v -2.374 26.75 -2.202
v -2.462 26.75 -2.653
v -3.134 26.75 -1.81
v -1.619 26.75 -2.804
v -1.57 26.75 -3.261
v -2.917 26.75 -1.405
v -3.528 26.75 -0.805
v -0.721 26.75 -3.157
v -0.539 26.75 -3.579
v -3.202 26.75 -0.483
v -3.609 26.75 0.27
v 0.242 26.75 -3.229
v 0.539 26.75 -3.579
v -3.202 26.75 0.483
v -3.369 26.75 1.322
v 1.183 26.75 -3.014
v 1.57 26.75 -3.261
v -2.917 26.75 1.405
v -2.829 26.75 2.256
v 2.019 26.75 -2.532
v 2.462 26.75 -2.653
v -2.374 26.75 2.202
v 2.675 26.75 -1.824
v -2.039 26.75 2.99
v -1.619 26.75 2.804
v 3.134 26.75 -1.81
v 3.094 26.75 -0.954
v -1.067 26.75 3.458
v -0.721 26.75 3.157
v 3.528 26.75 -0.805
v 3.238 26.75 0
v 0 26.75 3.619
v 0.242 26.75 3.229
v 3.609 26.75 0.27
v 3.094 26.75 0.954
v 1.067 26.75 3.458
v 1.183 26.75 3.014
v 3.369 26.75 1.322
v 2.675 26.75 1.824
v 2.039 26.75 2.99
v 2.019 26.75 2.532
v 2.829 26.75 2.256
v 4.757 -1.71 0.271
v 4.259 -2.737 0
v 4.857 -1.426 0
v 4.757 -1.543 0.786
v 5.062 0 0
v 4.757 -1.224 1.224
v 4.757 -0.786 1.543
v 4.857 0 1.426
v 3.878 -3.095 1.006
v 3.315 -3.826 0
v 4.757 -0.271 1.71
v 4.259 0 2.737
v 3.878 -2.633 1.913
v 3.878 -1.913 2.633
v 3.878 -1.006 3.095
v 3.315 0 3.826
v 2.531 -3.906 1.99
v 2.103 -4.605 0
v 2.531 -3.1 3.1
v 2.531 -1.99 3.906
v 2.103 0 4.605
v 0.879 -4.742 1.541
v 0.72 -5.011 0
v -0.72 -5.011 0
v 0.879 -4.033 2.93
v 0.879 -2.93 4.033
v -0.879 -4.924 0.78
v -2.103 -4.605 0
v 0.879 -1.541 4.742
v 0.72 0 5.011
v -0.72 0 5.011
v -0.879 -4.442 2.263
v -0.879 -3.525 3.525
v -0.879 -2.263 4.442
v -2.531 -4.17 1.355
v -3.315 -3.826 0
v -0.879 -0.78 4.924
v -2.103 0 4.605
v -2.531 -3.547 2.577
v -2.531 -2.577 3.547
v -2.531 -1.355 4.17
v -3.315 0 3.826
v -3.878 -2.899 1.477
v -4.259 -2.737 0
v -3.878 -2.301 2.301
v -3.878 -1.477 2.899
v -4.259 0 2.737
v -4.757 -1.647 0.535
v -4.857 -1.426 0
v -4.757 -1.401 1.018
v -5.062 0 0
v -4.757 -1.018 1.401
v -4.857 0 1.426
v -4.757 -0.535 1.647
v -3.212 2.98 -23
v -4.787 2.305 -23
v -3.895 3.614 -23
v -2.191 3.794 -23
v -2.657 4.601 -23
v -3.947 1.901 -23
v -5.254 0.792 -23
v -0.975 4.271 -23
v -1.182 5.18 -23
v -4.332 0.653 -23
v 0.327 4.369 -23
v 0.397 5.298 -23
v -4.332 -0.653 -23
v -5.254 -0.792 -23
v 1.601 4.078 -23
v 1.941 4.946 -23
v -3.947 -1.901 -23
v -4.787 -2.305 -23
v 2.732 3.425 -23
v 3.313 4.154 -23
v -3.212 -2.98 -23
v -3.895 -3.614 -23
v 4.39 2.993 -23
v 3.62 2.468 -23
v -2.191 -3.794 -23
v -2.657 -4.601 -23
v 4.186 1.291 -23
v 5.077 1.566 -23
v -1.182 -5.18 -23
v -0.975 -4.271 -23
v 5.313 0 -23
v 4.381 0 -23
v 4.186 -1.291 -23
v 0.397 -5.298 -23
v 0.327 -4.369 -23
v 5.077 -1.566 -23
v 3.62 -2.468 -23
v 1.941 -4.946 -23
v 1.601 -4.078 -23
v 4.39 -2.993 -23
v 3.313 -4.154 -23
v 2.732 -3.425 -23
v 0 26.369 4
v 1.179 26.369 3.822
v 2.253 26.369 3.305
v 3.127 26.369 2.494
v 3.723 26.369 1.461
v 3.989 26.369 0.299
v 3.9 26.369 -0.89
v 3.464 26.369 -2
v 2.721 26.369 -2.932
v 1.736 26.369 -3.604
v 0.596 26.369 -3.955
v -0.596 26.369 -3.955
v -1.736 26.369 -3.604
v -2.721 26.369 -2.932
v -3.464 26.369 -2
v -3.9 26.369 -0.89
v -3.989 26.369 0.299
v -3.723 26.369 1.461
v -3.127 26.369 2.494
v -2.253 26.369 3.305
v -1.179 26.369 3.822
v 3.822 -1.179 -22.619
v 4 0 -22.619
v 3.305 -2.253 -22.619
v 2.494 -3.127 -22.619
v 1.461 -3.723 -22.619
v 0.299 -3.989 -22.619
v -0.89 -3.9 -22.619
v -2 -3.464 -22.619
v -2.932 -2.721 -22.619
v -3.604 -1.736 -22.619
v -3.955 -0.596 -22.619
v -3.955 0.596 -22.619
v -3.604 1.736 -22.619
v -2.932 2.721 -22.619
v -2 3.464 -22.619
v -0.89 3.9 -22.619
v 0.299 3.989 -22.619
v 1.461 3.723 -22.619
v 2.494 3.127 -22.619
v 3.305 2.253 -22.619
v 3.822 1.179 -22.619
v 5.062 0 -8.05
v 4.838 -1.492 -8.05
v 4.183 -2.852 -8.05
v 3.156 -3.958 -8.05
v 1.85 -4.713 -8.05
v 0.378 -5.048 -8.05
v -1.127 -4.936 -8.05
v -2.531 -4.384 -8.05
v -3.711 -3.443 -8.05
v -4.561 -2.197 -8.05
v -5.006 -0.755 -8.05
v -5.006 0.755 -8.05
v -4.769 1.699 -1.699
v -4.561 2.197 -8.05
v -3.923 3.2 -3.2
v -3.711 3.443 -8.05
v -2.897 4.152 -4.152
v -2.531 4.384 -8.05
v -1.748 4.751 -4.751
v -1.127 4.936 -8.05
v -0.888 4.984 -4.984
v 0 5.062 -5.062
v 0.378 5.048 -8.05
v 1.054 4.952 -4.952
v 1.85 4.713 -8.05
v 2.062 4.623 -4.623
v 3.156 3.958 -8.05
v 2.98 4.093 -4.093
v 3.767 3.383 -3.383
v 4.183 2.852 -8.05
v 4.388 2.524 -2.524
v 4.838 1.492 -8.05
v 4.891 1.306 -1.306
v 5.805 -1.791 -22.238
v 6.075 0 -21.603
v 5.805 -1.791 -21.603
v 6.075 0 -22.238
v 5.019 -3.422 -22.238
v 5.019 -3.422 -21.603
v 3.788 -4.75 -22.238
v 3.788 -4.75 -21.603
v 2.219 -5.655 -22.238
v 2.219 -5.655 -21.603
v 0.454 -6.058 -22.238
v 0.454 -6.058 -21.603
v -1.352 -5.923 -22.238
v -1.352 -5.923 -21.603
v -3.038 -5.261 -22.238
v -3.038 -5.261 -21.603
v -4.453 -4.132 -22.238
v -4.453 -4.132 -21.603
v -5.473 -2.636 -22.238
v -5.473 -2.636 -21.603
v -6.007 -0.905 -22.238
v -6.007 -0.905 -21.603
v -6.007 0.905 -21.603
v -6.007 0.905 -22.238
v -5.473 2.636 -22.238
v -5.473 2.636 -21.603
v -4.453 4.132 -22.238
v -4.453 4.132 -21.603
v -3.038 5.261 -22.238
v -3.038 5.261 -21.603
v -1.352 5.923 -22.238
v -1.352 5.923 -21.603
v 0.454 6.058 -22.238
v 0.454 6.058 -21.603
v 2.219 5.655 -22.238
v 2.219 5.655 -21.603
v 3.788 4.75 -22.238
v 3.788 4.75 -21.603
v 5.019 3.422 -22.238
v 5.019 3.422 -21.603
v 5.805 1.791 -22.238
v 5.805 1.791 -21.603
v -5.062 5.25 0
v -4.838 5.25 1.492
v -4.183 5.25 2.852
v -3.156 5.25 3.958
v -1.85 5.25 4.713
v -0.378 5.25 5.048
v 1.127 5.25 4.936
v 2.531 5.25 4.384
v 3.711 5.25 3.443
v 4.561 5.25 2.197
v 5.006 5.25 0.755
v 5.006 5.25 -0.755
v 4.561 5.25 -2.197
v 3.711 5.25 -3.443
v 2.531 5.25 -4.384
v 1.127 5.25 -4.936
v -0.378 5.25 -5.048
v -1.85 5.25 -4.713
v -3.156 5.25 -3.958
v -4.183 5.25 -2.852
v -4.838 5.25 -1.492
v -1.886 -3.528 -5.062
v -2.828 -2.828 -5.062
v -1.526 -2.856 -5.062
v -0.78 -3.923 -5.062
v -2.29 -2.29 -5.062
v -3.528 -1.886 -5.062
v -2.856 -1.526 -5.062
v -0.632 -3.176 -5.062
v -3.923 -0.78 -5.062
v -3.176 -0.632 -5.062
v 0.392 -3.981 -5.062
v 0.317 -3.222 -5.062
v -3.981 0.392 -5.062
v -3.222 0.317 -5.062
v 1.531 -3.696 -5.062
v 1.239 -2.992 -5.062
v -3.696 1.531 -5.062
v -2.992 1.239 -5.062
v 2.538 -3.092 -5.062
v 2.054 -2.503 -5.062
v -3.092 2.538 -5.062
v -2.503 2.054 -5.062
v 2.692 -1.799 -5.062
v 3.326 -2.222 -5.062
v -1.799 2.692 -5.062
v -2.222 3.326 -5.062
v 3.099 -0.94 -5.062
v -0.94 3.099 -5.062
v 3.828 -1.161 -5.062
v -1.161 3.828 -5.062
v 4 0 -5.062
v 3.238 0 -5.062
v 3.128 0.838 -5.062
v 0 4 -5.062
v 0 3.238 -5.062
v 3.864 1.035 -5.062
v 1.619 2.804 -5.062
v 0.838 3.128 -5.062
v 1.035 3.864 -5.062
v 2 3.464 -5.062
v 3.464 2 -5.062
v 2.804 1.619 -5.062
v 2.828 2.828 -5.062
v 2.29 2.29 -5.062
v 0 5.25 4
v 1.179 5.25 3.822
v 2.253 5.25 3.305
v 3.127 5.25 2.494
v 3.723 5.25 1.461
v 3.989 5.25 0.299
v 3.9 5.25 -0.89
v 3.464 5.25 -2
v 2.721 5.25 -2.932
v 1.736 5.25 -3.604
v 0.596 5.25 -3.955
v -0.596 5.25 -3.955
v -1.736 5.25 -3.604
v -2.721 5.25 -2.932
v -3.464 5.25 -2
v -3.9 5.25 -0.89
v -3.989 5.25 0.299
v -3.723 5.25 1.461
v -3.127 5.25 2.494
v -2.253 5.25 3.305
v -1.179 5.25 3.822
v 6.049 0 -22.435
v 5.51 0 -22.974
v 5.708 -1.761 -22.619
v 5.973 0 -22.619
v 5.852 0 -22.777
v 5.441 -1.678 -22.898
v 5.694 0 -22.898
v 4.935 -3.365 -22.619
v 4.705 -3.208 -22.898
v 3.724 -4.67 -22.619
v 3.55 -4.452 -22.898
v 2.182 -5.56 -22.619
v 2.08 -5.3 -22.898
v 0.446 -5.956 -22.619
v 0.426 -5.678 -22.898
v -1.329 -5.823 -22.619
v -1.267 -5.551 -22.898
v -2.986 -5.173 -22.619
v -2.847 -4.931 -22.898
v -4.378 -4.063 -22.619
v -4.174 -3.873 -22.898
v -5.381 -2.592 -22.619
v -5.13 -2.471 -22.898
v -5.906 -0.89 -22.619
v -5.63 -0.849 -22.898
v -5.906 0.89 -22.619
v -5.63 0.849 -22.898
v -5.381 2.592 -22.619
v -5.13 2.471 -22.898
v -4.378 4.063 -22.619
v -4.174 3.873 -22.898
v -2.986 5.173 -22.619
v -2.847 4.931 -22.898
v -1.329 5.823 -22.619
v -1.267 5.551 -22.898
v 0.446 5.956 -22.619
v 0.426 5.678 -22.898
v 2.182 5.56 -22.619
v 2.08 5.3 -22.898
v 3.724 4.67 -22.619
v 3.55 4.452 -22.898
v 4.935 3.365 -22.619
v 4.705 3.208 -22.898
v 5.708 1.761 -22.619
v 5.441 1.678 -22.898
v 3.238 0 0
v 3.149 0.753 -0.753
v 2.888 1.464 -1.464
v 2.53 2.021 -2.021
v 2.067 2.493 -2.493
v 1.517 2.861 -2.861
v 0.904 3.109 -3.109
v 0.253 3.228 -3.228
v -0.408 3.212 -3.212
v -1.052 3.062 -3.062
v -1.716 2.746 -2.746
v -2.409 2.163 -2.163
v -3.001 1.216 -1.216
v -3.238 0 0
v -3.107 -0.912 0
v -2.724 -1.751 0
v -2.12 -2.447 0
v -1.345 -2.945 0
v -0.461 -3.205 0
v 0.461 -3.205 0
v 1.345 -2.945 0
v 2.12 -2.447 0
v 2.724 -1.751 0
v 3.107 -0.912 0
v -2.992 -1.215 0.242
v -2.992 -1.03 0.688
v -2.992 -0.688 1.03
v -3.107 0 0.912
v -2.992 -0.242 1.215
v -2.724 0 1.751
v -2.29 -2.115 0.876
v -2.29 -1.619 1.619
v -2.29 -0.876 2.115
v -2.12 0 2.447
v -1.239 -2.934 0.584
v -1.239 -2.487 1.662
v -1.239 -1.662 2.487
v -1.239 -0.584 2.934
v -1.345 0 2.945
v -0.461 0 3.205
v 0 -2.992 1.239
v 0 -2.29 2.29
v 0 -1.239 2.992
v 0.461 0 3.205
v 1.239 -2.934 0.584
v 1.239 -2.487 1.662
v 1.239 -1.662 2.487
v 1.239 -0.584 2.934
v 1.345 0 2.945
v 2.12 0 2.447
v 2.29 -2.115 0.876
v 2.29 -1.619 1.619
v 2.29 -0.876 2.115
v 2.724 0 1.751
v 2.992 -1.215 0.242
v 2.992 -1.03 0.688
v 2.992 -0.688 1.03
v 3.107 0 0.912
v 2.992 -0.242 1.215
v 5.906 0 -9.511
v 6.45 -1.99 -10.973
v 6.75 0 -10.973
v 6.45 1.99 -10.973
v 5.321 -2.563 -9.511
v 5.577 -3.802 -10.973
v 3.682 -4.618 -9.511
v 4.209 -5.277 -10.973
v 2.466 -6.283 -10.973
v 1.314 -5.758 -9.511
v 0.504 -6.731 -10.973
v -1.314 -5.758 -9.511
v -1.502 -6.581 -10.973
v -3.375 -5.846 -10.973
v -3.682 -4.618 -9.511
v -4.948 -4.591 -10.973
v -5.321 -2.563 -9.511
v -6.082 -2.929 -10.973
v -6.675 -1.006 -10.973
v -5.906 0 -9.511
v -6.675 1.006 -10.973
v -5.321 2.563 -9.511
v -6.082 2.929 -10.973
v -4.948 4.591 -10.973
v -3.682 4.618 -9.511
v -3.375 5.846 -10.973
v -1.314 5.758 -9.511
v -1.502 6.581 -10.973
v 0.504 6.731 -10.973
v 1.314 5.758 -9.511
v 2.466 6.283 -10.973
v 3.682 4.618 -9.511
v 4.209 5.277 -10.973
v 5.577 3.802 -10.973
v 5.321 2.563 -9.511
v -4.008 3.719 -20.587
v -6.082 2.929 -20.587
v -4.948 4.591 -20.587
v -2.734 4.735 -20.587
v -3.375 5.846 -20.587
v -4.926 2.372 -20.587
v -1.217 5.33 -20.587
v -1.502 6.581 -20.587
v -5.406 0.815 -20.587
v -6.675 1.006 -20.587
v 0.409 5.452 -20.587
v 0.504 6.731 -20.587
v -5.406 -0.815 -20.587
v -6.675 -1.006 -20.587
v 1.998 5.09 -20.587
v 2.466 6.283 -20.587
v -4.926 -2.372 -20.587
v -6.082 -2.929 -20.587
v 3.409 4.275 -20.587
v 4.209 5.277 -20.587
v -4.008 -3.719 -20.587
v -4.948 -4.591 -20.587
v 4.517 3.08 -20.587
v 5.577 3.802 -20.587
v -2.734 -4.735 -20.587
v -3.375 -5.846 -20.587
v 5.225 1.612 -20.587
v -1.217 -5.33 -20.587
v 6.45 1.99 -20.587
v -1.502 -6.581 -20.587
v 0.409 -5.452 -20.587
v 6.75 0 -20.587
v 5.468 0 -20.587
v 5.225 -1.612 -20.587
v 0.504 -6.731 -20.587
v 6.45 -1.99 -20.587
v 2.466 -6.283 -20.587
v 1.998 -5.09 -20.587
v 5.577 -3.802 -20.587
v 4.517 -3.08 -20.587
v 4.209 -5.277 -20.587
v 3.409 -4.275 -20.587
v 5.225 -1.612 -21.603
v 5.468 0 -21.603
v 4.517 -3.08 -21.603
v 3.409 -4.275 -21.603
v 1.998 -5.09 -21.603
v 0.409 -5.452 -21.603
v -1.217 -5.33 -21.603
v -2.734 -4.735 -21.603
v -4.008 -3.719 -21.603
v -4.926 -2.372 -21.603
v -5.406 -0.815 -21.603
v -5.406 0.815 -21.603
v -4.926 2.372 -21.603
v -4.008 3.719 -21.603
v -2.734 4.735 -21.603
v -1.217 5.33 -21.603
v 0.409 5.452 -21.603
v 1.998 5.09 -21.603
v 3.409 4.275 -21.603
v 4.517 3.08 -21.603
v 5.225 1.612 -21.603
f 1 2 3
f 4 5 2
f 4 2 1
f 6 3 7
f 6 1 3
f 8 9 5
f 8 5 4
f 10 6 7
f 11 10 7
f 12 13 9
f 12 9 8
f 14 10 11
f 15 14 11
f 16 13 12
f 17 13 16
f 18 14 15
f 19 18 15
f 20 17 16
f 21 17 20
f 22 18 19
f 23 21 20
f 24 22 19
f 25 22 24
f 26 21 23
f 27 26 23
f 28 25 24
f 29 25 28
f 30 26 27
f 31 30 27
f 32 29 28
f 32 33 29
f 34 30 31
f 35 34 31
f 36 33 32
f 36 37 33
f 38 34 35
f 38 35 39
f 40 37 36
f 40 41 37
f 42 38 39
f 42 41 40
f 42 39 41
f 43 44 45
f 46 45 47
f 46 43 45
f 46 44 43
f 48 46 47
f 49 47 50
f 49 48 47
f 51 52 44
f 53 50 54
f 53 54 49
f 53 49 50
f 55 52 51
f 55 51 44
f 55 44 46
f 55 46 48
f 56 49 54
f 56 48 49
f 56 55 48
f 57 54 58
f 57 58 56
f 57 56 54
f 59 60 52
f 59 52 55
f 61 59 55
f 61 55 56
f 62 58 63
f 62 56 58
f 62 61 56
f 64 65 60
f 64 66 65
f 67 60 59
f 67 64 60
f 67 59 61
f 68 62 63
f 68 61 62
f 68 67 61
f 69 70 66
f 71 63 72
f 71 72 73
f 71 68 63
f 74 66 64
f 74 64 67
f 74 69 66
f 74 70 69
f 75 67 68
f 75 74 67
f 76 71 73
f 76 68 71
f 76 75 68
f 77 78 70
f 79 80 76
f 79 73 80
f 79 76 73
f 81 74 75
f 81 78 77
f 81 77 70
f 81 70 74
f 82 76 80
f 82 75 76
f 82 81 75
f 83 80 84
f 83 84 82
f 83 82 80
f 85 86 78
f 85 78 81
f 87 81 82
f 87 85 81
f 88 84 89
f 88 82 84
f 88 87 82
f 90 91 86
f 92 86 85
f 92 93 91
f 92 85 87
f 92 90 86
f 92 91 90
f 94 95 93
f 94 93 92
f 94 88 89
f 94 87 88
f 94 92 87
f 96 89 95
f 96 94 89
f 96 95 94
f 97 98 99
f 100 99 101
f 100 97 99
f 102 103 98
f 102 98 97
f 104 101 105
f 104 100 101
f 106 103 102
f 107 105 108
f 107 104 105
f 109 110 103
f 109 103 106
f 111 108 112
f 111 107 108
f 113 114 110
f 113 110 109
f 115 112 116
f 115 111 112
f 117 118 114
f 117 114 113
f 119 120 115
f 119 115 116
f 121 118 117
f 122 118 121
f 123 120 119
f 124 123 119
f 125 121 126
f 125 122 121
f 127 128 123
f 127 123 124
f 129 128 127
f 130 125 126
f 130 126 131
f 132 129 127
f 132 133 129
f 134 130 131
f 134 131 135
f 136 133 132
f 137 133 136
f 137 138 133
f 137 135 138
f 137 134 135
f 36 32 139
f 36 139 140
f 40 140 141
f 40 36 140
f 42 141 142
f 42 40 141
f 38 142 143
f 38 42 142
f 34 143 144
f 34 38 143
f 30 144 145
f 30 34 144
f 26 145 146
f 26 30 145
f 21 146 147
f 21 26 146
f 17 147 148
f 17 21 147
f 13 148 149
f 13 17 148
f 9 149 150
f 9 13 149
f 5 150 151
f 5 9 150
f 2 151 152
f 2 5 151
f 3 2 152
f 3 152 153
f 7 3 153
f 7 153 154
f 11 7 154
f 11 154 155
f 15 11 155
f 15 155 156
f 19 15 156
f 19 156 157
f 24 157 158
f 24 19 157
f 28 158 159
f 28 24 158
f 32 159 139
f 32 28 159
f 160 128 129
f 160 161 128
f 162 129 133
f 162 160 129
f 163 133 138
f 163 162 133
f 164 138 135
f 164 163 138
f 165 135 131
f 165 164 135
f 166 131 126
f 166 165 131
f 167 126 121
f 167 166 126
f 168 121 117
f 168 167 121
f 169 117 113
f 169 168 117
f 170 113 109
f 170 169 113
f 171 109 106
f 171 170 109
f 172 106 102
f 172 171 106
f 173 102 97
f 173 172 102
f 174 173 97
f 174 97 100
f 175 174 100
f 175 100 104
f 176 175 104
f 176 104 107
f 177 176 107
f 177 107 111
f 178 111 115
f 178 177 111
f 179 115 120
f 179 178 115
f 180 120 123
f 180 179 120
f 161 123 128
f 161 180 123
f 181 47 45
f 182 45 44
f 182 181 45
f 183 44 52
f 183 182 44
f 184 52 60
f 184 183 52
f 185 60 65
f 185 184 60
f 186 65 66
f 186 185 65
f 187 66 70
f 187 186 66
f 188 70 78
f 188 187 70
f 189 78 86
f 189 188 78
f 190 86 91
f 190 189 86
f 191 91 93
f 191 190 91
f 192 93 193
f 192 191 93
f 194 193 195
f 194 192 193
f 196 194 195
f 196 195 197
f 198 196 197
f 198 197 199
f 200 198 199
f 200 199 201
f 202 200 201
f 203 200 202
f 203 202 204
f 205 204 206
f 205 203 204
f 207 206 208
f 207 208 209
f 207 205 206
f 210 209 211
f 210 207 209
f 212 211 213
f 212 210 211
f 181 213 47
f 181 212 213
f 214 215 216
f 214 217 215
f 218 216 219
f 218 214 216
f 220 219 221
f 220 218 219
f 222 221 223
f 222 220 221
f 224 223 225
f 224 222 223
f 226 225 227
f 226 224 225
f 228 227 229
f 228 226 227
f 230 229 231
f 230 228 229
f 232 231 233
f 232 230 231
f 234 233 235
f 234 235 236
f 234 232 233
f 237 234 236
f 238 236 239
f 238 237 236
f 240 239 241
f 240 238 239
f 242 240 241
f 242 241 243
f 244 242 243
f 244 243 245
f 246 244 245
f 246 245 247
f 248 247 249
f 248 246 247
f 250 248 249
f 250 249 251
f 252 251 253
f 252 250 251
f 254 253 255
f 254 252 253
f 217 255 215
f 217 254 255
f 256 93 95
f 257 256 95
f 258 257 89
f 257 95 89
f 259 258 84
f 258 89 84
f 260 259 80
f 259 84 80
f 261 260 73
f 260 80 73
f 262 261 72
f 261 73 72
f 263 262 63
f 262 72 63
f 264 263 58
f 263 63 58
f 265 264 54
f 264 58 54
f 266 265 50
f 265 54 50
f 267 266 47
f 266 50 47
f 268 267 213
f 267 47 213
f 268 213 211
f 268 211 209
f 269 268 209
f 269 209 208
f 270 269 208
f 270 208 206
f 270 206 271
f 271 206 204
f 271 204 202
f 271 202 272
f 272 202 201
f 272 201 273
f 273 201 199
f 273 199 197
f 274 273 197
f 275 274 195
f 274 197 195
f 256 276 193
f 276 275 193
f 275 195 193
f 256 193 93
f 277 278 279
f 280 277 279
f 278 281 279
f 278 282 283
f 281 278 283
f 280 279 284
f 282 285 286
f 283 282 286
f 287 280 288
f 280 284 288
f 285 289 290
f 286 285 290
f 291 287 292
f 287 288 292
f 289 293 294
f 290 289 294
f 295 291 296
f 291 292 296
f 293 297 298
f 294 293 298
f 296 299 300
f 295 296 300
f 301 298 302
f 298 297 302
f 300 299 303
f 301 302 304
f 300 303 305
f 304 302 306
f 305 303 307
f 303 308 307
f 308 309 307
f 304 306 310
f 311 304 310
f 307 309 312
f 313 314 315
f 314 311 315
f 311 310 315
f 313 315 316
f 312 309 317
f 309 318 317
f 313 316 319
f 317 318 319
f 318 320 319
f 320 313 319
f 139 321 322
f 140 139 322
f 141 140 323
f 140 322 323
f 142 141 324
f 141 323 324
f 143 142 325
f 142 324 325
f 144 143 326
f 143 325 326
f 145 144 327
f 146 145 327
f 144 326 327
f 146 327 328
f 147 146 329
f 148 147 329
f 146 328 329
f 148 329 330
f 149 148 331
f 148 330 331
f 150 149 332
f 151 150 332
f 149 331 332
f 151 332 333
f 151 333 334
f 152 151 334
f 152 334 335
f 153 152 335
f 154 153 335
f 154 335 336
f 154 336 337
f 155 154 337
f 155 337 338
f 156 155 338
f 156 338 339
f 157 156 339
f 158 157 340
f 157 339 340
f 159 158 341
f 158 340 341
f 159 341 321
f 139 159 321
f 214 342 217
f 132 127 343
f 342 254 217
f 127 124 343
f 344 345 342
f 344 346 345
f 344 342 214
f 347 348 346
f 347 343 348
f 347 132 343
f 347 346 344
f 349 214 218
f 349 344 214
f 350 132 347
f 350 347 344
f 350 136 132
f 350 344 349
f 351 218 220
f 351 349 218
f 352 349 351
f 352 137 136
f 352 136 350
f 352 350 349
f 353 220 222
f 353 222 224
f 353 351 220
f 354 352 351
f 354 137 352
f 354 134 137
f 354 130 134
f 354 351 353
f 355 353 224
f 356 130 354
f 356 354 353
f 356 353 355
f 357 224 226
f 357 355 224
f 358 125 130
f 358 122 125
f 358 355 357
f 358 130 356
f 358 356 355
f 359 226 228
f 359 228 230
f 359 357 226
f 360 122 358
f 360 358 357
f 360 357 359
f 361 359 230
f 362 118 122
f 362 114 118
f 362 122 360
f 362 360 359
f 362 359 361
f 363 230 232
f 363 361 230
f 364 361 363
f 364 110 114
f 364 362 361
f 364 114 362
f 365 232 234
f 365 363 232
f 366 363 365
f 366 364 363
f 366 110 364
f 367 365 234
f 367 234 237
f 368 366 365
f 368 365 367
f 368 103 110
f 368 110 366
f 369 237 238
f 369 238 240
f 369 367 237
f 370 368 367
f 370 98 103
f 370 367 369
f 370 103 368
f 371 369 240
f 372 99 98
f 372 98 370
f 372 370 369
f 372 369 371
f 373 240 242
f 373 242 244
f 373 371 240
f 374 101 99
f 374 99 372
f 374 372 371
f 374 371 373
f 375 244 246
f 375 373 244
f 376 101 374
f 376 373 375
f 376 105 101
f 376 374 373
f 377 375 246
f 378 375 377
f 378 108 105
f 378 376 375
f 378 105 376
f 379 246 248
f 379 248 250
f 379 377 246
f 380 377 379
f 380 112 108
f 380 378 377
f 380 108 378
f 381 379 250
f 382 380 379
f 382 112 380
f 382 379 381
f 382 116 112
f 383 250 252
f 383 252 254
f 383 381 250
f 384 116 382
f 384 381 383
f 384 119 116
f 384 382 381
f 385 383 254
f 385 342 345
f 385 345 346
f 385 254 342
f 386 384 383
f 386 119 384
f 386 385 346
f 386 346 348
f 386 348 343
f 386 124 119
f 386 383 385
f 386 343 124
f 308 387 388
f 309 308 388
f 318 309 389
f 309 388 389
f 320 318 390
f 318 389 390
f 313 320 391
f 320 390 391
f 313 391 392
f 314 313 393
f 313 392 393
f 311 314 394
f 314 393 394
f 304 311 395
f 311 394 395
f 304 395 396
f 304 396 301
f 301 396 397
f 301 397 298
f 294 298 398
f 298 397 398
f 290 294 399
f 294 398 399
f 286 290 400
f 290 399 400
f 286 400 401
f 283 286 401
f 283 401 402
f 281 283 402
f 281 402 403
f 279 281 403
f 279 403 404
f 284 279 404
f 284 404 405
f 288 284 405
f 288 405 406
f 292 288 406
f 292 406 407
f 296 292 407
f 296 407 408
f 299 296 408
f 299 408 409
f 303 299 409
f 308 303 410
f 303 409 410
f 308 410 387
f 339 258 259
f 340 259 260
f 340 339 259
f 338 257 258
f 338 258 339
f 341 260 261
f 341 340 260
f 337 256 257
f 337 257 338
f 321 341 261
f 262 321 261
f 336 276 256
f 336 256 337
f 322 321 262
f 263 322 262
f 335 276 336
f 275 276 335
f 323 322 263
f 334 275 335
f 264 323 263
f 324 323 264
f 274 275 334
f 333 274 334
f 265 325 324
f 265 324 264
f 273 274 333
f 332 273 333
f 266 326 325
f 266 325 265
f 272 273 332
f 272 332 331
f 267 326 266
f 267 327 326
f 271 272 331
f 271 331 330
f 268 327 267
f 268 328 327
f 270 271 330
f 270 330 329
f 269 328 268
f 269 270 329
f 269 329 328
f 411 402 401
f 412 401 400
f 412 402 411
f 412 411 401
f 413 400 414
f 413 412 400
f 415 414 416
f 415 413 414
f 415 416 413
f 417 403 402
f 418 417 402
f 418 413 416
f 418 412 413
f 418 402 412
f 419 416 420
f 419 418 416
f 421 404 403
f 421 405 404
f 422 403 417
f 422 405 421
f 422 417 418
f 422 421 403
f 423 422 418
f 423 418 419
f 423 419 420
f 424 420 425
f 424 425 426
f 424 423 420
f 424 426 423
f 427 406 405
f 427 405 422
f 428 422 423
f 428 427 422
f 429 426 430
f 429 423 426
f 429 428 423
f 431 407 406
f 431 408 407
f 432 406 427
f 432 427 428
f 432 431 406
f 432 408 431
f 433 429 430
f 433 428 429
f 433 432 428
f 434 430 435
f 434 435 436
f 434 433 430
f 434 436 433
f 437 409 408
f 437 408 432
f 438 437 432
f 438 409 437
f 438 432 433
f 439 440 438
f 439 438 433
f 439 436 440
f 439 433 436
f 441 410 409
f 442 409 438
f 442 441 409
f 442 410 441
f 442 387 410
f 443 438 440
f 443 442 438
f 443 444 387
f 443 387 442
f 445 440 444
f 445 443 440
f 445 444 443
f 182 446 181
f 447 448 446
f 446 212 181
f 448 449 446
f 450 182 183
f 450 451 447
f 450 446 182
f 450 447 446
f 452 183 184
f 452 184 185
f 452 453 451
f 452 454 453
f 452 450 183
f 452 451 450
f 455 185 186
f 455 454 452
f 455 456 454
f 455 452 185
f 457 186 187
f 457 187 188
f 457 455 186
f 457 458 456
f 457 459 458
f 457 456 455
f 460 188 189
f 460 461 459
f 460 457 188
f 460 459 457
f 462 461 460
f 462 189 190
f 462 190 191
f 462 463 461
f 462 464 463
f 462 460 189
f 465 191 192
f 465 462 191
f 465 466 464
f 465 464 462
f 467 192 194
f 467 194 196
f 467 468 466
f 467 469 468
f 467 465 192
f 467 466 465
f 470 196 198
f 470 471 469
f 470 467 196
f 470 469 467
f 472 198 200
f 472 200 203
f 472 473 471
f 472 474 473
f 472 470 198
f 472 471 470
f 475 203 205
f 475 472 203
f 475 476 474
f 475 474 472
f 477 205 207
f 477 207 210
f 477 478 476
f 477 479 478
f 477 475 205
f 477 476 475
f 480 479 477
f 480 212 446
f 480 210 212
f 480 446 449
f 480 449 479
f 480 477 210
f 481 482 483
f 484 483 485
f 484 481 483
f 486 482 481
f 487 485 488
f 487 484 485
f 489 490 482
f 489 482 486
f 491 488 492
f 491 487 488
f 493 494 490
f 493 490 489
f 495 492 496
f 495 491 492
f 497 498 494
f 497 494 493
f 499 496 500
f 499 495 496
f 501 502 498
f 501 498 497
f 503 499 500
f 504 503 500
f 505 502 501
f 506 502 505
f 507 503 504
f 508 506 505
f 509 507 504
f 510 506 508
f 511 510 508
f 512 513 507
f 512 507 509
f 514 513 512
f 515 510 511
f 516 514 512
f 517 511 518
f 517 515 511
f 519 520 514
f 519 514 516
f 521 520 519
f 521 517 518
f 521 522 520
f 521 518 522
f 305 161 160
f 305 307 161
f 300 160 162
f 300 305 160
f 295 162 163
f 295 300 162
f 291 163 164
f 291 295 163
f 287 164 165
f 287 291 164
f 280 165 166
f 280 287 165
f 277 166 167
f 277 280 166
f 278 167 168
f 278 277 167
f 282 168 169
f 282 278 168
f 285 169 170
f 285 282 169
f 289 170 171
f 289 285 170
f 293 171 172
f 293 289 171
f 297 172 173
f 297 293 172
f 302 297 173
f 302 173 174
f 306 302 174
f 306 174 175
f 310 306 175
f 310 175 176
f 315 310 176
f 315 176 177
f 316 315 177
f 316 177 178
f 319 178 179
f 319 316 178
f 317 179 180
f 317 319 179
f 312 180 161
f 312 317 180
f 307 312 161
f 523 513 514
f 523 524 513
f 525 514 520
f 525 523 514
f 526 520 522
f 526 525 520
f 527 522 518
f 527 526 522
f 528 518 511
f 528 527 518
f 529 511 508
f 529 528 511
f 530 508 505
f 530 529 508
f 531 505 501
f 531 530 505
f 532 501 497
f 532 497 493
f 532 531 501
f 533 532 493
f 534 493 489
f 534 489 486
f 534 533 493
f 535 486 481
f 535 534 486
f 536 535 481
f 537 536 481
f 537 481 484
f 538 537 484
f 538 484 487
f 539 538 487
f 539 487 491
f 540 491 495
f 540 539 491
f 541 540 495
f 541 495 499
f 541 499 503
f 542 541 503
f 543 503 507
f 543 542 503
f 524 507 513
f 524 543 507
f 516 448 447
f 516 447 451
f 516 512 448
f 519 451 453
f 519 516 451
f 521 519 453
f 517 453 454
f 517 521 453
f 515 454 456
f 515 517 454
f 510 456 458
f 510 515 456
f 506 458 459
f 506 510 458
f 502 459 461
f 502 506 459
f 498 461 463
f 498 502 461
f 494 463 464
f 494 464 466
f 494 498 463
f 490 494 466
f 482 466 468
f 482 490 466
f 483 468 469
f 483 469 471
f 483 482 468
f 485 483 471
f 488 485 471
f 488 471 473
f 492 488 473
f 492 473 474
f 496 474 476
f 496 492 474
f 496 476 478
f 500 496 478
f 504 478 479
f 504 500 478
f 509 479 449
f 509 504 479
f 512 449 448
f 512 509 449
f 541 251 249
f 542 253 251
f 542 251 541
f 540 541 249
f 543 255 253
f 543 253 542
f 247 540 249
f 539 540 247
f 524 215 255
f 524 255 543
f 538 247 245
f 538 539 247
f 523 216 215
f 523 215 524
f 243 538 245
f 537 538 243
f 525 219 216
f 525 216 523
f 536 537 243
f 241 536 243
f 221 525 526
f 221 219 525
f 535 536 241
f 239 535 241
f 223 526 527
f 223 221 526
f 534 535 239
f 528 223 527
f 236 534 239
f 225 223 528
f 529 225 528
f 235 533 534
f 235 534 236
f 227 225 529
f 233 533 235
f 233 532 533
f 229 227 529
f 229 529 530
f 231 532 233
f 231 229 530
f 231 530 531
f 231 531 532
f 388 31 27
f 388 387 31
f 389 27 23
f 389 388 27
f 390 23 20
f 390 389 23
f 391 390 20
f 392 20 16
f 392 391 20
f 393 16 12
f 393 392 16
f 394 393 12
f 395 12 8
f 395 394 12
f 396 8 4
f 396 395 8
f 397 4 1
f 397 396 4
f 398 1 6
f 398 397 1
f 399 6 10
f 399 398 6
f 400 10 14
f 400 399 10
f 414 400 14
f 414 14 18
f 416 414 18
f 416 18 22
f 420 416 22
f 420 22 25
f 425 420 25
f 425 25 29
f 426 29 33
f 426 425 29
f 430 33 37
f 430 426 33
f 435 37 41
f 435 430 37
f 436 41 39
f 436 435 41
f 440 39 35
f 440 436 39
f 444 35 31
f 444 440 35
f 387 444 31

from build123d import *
from build123d.topology import SkipClean

# Parameters (mm, degrees)
SKETCH9_R          = 4
SKETCH9_R_2        = 3.238
EXTRUDE1_DEPTH     = 5.0625
REVOLVE2_ANGLE     = 90
EXTRUDE2_DEPTH     = 5.25
EXTRUDE5_START     = -5.25
SKETCH16_R         = 5.0625
SKETCH16_R_2       = 3.238
EXTRUDE5_DEPTH     = 5.25
SKETCH12_R         = 3.238
CUT_EXTRUDE1_DEPTH = 25.90230913
CUT_EXTRUDE2_START = 5.0625
SKETCH13_R         = 3.238
CUT_EXTRUDE2_DEPTH = 5.0625
SKETCH15_R         = 4
SKETCH15_R_2       = 3.238
EXTRUDE4_DEPTH     = 21.5
CHAMFER1_SIZE      = 0.381


with BuildPart() as part:
    # Sketch8 → Revolve1 (revolve)
    with BuildSketch(Plane(origin=(0, 0, 0), x_dir=(0, 0, -1), z_dir=(1, 0, 0)), mode=Mode.PRIVATE) as revolve1_sk:
        with BuildLine():
            Line((21.603, 6.075), (22.238, 6.075))
            ThreePointArc((22.238, 6.075), (22.776815367, 5.851815367), (23, 5.313))
            Line((23, 5.313), (23, 4.381))
            Line((23, 4.381), (22.619, 4))
            Line((22.619, 4), (0, 4))
            Line((0, 4), (0, 5.0625))
            Line((0, 5.0625), (8.05, 5.0625))
            Line((8.05, 5.0625), (10.972835738, 6.75))
            Line((10.972835738, 6.75), (20.587, 6.75))
            Line((20.587, 6.75), (20.587, 5.4675))
            Line((20.587, 5.4675), (21.603, 5.4675))
            Line((21.603, 5.4675), (21.603, 6.075))
        make_face()
    revolve(revolve1_sk.sketch.rotate(Axis((0, 0, 0), (0, 0, -1)), 90), axis=Axis((0, 0, 0), (0, 0, -1)))

    # Sketch9 → Extrude1 (add)
    with BuildSketch(Plane.XY):
        Circle(SKETCH9_R)
        Circle(SKETCH9_R_2, mode=Mode.SUBTRACT)
    extrude(amount=-EXTRUDE1_DEPTH)

    # Sketch11 → Revolve2 (revolve)
    with BuildSketch(Plane.XY):
        with BuildLine():
            Line((-5.0625, 0), (-3.238, 0))
            ThreePointArc((-3.238, 0), (0, -3.238), (3.238, 0))
            Line((3.238, 0), (5.0625, 0))
            ThreePointArc((5.0625, 0), (0, -5.0625), (-5.0625, 0))
        make_face()
    revolve(axis=Axis((-5.0625, 0, 0), (-1, 0, 0)), revolution_arc=REVOLVE2_ANGLE)

    # Sketch14 → Extrude2 (add)
    with BuildSketch(Plane(origin=(0, 0, 0), x_dir=(-1, 0, 0), z_dir=(0, 1, 0))):
        with BuildLine():
            Line((-5.0625, 0), (-3.238, 0))
            ThreePointArc((-3.238, 0), (0, 3.238), (3.238, 0))
            Line((3.238, 0), (5.0625, 0))
            ThreePointArc((5.0625, 0), (0, 5.0625), (-5.0625, 0))
        make_face()
    extrude(amount=EXTRUDE2_DEPTH)

    # Sketch16 → Extrude5 (add)
    with SkipClean():  # the faces are left unmerged after this step: merging them gives an invalid solid
        with BuildSketch(Plane(origin=(0, 5.25, 0), x_dir=(-1, 0, 0), z_dir=(0, 1, 0)).offset(EXTRUDE5_START)):
            with Locations(Location((0, 0, 0), (0, 0, 180))):
                Circle(SKETCH16_R)
            with Locations(Location((0, 0, 0), (0, 0, 180))):
                Circle(SKETCH16_R_2, mode=Mode.SUBTRACT)
        extrude(amount=EXTRUDE5_DEPTH)

    # Sketch12 → Cut-Extrude1 (cut, through all)
    with BuildSketch(Plane(origin=(0, 0, 0), x_dir=(1, 0, 0), z_dir=(0, 1, 0))):
        Circle(SKETCH12_R)
    extrude(amount=CUT_EXTRUDE1_DEPTH, mode=Mode.SUBTRACT)

    # Sketch13 → Cut-Extrude2 (cut)
    with BuildSketch(Plane.XY.offset(-5.0625).offset(CUT_EXTRUDE2_START)):
        Circle(SKETCH13_R)
    extrude(amount=-CUT_EXTRUDE2_DEPTH, mode=Mode.SUBTRACT)

    # Sketch15 → Extrude4 (add)
    with BuildSketch(Plane(origin=(0, 5.25, 0), x_dir=(-1, 0, 0), z_dir=(0, 1, 0))):
        with Locations(Location((0, 0, 0), (0, 0, 90))):
            Circle(SKETCH15_R)
        with Locations(Location((0, 0, 0), (0, 0, 180))):
            Circle(SKETCH15_R_2, mode=Mode.SUBTRACT)
    extrude(amount=EXTRUDE4_DEPTH)

    # Chamfer1
    chamfer1_edges = [part.edges().sort_by_distance(p)[0] for p in [
        (0, 26.75, -4),
    ]]
    chamfer(chamfer1_edges, length=CHAMFER1_SIZE)


solid = part.part
